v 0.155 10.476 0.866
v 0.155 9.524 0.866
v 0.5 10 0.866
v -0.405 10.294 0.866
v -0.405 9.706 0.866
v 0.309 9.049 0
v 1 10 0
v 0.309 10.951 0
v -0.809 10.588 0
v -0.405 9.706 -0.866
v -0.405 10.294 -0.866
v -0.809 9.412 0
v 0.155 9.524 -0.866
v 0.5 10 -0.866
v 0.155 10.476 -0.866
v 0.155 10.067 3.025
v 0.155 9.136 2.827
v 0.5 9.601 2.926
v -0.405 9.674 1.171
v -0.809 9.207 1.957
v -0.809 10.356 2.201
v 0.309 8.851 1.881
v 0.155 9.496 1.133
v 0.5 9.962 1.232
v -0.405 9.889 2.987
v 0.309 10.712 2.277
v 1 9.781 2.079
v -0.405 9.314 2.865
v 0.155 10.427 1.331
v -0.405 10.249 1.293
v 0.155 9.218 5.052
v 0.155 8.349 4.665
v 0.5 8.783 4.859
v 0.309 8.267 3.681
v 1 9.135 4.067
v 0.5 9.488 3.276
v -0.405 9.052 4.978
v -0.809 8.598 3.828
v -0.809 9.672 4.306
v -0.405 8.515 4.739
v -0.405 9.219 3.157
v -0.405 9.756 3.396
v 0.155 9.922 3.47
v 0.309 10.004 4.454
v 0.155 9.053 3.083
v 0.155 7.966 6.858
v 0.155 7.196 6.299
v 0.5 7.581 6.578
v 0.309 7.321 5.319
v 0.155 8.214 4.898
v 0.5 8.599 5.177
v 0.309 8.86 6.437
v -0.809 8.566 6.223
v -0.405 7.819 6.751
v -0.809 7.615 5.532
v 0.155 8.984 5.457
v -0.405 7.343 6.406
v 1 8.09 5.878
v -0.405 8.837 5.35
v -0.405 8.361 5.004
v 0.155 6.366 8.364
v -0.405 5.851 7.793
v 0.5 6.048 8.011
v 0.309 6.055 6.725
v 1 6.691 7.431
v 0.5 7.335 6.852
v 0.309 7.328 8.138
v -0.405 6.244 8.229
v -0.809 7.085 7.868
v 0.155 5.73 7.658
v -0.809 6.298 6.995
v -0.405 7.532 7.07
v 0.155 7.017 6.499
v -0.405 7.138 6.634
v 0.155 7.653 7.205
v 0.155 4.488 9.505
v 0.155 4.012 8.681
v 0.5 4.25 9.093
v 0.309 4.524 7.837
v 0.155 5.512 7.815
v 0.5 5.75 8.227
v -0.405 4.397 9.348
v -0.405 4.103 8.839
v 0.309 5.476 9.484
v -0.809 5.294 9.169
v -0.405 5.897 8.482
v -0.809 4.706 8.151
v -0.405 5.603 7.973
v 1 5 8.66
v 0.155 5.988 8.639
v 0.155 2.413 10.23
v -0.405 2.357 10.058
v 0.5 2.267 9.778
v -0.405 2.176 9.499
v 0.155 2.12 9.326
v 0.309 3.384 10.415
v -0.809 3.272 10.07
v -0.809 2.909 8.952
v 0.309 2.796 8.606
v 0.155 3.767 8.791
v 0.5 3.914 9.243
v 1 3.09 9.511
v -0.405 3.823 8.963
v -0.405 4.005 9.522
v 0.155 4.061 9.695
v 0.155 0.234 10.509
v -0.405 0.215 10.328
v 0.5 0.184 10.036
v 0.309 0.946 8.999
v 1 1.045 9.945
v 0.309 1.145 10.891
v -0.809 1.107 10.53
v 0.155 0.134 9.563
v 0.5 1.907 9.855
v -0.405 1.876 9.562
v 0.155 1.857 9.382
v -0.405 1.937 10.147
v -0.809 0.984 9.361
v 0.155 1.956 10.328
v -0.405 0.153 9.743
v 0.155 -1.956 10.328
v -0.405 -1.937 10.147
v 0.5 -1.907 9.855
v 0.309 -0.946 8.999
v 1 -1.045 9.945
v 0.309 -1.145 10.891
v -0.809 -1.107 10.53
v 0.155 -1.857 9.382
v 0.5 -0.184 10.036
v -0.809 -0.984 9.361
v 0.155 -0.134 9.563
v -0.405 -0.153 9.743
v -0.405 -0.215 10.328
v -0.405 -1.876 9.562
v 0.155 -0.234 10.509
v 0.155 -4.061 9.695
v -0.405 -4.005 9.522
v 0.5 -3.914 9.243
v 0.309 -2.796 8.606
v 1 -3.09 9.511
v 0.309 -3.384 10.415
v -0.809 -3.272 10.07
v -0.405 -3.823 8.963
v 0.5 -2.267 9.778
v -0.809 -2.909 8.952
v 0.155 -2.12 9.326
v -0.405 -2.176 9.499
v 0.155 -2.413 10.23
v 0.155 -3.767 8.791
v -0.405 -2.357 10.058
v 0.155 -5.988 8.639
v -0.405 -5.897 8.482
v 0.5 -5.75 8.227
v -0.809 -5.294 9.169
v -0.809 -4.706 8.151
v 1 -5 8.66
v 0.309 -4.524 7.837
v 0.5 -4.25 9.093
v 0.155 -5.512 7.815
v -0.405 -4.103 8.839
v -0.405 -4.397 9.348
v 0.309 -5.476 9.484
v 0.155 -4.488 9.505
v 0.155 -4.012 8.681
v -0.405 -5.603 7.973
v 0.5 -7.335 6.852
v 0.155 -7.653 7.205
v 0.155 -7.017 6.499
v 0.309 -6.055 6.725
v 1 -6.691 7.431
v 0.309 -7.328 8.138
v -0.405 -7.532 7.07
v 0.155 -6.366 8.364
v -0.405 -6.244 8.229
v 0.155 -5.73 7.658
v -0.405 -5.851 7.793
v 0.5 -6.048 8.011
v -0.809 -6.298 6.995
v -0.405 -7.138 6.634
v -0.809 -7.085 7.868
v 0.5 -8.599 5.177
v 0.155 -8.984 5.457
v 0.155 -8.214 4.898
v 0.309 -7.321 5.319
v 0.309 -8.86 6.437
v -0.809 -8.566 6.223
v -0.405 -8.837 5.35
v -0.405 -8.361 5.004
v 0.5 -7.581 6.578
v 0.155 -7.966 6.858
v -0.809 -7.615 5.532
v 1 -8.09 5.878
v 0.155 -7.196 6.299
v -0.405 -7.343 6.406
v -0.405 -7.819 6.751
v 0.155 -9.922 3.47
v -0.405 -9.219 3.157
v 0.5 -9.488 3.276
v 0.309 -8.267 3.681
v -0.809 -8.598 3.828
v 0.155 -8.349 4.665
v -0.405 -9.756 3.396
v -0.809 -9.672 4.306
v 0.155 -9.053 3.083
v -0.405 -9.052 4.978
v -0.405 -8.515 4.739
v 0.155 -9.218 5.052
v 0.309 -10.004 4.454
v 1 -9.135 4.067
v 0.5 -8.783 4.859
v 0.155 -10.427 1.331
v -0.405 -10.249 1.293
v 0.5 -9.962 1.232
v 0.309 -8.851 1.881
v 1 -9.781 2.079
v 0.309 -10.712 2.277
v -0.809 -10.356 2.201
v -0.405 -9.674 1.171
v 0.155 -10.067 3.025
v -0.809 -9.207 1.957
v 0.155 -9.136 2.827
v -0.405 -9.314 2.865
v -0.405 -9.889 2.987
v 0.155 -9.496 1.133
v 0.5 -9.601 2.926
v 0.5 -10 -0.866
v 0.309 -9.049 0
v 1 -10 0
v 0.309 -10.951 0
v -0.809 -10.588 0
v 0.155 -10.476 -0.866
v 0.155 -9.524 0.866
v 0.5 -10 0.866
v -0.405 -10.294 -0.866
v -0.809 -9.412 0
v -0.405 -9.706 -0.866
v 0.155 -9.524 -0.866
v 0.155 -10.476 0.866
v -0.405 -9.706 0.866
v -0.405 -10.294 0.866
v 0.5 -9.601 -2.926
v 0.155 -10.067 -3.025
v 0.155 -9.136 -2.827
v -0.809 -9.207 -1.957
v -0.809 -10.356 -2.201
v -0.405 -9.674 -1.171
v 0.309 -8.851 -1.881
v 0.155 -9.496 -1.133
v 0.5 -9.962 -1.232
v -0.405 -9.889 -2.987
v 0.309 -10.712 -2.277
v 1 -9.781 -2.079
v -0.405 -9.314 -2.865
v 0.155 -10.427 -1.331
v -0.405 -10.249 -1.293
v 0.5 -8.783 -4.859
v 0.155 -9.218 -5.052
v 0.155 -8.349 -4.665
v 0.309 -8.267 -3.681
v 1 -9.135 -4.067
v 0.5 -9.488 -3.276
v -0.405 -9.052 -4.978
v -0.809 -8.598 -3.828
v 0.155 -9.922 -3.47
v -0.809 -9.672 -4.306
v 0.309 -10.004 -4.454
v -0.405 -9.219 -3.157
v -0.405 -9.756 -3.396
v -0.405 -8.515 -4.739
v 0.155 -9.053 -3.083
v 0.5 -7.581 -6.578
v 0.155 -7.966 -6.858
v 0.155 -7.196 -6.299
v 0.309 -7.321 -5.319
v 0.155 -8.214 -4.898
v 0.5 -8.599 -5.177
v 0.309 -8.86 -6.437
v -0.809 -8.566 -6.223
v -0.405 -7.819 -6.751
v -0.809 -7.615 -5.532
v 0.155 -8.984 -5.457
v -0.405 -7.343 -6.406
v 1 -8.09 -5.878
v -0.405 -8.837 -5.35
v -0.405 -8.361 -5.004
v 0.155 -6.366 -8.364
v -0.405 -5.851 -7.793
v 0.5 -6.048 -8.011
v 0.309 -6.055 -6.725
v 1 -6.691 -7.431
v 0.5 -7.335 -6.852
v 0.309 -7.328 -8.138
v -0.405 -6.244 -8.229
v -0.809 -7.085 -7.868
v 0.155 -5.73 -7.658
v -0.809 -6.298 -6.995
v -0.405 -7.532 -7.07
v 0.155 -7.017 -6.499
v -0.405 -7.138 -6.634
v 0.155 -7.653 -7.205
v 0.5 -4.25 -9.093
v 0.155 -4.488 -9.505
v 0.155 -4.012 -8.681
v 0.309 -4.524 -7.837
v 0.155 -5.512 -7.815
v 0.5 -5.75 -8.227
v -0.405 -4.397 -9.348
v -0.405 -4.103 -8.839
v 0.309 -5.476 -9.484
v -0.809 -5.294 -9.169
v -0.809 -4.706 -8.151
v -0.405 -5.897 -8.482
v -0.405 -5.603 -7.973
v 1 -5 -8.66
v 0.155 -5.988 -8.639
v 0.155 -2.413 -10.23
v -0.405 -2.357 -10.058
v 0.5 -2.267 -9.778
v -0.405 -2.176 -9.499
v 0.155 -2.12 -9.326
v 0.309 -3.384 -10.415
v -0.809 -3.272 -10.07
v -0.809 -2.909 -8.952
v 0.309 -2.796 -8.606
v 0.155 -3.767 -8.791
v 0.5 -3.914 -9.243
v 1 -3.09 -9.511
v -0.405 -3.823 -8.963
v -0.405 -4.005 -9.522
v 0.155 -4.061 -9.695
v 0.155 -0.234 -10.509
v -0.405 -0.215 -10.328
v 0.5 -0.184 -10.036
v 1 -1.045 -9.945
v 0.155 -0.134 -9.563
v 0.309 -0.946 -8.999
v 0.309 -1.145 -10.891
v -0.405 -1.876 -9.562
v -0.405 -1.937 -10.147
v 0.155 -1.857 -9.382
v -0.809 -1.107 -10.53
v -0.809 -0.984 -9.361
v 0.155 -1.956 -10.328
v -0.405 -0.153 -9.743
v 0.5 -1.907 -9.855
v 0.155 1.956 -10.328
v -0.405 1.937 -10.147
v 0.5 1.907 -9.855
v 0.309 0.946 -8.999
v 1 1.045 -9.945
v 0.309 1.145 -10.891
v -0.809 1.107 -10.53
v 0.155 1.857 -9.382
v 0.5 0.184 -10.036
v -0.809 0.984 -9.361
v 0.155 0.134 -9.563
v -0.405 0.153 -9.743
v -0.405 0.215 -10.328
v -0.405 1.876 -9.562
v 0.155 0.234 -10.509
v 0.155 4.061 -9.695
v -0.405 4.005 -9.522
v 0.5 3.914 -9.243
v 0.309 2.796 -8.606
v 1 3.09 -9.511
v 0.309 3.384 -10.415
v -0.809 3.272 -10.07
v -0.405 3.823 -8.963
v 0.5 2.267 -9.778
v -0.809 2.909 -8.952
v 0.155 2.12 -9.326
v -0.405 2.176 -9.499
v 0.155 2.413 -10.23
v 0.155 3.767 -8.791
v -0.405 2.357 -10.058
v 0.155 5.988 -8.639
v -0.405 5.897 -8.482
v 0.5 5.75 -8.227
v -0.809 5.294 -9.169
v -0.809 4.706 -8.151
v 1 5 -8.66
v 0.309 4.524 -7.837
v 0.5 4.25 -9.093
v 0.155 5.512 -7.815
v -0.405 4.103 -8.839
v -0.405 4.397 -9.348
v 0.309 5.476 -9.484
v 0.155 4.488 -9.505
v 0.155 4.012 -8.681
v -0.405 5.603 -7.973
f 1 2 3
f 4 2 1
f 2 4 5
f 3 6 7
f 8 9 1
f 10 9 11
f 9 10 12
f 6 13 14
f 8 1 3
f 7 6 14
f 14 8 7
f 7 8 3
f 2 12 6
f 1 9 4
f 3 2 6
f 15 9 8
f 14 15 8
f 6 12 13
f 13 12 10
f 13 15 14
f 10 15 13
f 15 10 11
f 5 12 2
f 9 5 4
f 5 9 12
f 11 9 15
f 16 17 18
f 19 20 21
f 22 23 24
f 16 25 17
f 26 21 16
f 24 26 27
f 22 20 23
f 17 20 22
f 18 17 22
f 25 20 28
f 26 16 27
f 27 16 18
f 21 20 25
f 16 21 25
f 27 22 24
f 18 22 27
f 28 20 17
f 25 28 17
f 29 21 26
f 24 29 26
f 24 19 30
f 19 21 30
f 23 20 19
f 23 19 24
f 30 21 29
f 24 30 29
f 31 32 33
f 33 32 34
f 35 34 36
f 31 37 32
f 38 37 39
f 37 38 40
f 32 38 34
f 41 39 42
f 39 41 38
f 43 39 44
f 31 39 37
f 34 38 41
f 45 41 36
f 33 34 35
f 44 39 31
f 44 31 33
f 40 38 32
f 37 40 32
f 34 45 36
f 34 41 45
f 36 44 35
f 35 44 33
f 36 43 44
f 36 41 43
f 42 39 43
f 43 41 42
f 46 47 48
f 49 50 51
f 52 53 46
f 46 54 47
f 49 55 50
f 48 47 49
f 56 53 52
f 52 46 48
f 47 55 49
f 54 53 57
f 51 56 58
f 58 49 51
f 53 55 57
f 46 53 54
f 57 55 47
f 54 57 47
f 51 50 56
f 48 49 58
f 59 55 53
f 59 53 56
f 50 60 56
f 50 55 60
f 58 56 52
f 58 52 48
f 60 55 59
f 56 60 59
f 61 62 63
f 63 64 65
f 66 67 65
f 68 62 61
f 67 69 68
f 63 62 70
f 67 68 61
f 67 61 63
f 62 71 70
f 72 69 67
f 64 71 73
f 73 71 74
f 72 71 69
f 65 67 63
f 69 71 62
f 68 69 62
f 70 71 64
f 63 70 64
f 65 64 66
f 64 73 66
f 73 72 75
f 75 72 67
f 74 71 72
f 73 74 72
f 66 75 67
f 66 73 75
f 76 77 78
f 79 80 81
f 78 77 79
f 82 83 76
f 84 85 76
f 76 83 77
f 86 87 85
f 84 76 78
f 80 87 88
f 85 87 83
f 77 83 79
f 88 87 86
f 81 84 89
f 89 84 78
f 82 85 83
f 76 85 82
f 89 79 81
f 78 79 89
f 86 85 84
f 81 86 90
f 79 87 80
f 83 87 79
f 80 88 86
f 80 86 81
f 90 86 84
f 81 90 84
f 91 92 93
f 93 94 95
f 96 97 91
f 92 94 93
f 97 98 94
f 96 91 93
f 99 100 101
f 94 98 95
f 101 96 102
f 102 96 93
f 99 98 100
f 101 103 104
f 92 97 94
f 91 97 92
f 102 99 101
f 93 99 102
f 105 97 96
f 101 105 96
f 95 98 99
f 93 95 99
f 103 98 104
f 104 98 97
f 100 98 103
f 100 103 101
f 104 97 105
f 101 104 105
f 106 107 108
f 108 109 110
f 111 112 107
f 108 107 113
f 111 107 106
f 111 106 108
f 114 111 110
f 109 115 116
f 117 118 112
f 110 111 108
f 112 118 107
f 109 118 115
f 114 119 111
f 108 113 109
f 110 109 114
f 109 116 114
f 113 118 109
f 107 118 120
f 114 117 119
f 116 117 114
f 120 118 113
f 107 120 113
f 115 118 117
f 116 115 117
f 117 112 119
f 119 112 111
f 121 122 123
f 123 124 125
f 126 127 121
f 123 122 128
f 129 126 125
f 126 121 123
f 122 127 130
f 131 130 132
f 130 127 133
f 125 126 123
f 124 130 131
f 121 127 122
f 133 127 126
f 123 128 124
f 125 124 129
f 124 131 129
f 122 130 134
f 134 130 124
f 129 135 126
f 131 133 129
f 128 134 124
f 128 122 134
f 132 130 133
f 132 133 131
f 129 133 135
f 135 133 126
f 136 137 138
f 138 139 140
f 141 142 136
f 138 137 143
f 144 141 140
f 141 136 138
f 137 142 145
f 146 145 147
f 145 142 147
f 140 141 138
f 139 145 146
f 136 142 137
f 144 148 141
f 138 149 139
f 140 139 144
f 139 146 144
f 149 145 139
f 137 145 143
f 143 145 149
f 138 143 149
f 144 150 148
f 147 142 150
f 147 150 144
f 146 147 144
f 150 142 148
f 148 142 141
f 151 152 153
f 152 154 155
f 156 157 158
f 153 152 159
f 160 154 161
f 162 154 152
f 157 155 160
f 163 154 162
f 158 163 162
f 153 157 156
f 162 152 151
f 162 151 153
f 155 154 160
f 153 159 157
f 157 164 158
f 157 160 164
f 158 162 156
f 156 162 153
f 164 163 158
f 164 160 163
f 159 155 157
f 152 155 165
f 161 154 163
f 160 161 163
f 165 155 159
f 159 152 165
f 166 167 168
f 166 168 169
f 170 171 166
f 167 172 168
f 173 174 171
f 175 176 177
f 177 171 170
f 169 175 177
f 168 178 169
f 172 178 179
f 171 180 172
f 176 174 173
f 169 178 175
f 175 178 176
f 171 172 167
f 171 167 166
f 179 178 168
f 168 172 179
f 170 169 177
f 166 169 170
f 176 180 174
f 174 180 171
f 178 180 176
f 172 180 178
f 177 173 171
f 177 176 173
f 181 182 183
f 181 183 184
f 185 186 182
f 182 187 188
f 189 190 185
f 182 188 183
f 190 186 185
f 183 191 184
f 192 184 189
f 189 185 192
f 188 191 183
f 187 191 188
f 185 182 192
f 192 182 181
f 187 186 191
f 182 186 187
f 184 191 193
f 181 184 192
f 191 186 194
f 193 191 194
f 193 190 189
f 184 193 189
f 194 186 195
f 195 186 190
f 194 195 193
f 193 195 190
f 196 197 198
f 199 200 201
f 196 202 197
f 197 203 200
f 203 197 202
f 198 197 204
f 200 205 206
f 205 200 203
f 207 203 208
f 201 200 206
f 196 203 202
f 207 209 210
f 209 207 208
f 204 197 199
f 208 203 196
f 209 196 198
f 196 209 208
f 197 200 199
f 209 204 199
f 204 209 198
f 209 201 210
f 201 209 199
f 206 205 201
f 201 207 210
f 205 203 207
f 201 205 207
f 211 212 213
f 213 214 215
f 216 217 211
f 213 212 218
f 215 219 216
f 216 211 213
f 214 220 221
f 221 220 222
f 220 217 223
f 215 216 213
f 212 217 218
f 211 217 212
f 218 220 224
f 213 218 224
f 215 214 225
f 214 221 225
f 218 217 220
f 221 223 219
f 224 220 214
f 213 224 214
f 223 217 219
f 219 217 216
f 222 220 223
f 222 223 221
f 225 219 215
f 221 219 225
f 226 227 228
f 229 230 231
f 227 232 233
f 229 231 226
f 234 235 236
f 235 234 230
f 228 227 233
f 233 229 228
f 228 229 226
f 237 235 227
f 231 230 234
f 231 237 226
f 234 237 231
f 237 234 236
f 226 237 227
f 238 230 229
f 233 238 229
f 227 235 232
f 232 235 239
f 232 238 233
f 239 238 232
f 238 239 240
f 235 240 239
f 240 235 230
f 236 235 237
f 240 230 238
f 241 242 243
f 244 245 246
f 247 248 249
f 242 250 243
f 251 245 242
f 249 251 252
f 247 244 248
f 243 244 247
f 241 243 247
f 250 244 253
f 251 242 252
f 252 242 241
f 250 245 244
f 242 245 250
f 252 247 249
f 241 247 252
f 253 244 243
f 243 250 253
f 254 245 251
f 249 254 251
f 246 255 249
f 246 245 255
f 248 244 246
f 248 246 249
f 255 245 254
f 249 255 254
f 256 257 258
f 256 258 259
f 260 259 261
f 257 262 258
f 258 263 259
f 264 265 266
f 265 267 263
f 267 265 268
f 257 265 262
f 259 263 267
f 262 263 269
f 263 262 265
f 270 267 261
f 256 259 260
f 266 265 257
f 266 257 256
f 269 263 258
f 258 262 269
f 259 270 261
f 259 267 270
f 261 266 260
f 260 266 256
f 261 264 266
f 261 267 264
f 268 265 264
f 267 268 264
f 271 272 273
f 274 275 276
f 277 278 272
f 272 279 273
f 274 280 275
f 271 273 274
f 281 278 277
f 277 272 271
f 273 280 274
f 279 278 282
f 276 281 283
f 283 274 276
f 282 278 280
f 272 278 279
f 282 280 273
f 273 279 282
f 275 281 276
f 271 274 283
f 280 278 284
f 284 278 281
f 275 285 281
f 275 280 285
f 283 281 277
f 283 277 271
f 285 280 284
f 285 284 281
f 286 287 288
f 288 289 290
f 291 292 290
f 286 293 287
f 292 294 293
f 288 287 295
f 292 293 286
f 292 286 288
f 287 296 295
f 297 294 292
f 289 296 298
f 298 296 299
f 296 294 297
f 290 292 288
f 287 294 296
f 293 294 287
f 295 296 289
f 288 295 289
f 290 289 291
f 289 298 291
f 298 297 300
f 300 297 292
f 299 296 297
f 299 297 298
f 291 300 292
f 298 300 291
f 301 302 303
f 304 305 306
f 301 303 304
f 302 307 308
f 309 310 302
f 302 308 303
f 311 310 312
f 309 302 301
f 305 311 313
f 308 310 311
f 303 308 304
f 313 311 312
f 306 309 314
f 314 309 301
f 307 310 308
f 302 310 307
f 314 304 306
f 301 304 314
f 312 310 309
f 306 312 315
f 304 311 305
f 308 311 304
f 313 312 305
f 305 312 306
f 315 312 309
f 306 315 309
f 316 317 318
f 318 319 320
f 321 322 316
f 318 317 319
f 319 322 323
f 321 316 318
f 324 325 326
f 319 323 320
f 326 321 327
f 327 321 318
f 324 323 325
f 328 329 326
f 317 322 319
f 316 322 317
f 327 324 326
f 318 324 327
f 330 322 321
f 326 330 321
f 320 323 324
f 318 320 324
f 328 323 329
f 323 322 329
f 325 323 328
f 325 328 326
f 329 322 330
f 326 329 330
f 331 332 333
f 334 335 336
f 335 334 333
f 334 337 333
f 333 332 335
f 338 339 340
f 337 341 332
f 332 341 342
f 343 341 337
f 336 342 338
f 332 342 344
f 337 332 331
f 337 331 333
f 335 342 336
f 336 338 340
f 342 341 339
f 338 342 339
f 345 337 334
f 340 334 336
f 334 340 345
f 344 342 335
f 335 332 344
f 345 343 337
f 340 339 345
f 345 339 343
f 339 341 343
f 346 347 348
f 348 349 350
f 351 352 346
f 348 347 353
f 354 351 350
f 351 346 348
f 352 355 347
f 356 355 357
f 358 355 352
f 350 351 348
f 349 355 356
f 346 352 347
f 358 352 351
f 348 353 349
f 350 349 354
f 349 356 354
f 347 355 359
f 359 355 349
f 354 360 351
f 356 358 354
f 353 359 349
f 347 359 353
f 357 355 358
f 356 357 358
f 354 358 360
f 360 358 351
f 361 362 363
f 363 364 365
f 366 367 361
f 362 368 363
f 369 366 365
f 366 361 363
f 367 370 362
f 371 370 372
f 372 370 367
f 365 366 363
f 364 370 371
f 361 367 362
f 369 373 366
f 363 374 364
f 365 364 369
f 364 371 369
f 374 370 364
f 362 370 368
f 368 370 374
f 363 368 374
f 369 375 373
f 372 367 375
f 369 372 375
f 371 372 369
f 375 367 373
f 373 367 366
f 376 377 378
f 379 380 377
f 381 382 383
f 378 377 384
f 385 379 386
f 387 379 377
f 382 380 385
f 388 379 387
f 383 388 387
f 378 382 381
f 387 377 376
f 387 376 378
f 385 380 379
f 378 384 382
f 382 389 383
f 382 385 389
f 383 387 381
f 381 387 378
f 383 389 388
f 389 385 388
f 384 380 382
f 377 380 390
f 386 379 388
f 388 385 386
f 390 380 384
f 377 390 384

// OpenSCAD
// https://ja.wikibooks.org/wiki/OpenSCAD_User_Manual/%E6%9D%A1%E4%BB%B6%E3%81%A8%E7%B9%B0%E3%82%8A%E8%BF%94%E3%81%97

// 例1 - 配列要素に基づく繰り返し:
// for (z = [-1, 1]) // z = -1, z = 1 の2つの繰り返し
// {
//     translate([0, 0, z])
//     cube(size = 1, center = false);
// }

// 例2a - 範囲の繰り返し:
// for ( i = [0 : 5] )
// {
//     rotate( i * 360 / 6, [1, 0, 0])
//     translate([0, 10, 0])
//     sphere(r = 3);
// }

// 例2b - 増分を指定した範囲の繰り返し:
// 注: 2番めの引数 (この場合 '0.2' ) が増分
// 注: 増分によっては、実際の終値は与えられた終値
// より小さい場合がある。
for ( i = [0 : 0.2 : 5] )
{
    rotate( i * 360 / 6, [1, 0, 0])
    translate([0, 10, 0])
    sphere(r = 1);
}




// 例1 - 範囲の繰り返し:
* intersection_for(n = [1 : 6])
{
    rotate([0, 0, n * 60])
    {
        translate([5,0,0])
        sphere(r=12);
    }
}

// 例2 - 回転:
* intersection_for(i = [ [  0,  0,   0],
 			[ 10, 20, 300],
 			[200, 40,  57],
 			[ 20, 88,  57] ])
{
    rotate(i)
    cube([100, 20, 20], center = true);
}
